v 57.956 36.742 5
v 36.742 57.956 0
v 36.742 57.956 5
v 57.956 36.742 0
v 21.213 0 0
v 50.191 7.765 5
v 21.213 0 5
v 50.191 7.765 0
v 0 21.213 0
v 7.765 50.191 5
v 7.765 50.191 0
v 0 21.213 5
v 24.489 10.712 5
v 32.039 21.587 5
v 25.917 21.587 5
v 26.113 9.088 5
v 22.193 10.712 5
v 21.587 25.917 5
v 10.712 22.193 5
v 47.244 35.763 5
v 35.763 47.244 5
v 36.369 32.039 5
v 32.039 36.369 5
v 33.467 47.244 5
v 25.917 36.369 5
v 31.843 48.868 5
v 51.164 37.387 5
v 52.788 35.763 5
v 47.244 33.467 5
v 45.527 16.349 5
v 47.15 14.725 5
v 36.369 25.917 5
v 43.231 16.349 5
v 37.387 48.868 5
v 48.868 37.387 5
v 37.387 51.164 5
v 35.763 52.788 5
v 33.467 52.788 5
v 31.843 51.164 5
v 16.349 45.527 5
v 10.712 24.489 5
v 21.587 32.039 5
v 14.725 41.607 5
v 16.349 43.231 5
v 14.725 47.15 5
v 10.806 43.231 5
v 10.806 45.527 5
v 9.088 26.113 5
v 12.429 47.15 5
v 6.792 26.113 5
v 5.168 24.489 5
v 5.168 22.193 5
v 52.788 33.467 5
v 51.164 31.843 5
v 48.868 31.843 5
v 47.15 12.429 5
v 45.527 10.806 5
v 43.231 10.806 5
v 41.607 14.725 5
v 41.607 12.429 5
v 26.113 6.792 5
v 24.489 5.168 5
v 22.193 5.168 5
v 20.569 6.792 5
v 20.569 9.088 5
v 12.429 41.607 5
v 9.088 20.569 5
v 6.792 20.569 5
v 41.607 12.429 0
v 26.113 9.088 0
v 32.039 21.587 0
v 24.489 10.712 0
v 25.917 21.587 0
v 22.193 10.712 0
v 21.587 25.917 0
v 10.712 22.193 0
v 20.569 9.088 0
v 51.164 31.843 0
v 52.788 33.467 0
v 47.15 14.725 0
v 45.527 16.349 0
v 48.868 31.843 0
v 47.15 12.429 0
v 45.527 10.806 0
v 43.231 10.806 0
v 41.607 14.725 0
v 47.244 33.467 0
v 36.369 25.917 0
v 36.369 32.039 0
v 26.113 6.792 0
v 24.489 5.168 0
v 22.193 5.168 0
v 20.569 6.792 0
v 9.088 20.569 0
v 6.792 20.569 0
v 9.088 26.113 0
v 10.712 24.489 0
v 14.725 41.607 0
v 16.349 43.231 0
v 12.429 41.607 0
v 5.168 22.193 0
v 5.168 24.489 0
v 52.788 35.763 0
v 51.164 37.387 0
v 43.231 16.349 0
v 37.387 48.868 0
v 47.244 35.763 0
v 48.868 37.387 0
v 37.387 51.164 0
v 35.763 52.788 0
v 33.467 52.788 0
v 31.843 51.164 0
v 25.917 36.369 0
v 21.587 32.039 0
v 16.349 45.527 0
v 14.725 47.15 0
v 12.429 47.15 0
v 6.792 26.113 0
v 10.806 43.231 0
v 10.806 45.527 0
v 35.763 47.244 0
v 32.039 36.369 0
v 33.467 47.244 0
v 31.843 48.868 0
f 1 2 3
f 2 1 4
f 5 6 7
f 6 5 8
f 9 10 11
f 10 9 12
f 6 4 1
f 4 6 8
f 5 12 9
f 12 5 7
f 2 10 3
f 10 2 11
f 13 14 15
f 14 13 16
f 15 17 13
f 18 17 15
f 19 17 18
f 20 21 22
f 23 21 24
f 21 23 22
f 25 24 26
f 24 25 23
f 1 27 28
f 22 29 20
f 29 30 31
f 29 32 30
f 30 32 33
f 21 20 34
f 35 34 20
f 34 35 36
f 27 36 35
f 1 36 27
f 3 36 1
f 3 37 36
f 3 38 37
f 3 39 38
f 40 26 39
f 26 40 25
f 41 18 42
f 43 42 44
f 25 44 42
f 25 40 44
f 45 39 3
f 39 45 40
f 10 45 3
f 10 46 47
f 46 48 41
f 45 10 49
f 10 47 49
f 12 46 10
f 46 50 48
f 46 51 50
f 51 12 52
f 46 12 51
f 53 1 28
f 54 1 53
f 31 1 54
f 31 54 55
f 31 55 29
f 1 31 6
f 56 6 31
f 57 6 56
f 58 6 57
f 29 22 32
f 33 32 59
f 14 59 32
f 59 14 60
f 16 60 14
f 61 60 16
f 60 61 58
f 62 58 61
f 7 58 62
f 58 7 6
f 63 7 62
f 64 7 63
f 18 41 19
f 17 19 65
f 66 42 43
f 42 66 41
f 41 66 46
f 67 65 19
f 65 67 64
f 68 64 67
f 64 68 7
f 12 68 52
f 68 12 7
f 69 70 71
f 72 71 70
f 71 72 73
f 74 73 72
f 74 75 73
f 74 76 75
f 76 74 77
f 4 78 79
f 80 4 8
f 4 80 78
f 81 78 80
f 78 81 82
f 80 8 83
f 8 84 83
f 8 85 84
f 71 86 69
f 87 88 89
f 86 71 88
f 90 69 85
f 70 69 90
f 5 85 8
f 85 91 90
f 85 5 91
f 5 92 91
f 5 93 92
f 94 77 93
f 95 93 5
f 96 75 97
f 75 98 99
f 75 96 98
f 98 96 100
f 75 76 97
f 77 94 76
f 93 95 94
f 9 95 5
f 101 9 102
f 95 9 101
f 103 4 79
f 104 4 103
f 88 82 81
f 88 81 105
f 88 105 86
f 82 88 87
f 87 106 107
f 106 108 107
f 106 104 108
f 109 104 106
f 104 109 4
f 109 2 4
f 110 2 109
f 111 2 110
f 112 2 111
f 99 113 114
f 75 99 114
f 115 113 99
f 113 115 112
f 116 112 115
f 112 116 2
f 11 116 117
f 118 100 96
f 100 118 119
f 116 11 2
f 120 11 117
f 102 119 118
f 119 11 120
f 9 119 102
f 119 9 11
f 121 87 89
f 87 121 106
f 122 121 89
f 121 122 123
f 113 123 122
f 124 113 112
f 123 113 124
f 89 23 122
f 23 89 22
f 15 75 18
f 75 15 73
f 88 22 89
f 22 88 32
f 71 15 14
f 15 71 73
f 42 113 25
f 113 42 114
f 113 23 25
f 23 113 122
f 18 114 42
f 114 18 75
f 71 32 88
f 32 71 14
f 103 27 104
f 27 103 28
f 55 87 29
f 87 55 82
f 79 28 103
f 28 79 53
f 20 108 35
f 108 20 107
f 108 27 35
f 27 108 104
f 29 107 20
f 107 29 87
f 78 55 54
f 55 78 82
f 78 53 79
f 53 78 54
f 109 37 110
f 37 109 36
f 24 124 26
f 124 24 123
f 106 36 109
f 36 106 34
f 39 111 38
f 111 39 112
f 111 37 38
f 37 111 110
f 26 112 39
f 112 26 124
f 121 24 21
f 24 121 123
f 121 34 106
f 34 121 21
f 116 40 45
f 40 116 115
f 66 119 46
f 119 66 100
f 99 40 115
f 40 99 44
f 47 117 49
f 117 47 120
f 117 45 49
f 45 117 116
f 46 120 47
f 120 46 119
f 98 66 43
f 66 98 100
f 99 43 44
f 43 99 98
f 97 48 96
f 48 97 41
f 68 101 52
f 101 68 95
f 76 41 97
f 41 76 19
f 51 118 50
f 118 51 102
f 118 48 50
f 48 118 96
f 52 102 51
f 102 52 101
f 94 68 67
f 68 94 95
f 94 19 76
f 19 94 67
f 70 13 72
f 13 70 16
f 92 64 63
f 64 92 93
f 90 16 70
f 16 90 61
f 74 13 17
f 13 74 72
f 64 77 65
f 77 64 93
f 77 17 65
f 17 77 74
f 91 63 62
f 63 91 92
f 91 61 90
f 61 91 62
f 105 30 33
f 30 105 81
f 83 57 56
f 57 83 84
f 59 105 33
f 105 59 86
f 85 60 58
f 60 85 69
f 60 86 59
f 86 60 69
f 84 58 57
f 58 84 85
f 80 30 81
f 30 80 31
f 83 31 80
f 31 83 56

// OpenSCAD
$fn = 32;

// ----------------------------------------------------------------------
// Polygon plate: 6-gon R30, 6 bolt windows
// ----------------------------------------------------------------------

// --- parameters (mm) ---
sides = 6;                // number of polygon sides
plate_r = 30;             // circumscribed radius of the polygon
bore_r = 8;               // centre bore radius
bolts = 6;                // number of bolt windows
ring_r = 21.78;           // bolt-circle radius
bolt_r = 3;               // bolt window radius
plate_t = 5;              // plate thickness, Z (extrusion height)

plate_d = 2 * plate_r;  // circumscribed diameter
bore_d = 2 * bore_r;  // centre bore diameter
bolt_d = 2 * bolt_r;  // bolt window diameter
ring_d = 2 * ring_r;  // bolt-circle diameter

profile = [[57.956, 36.742], [36.742, 57.956], [7.765, 50.191], [0, 21.213], [21.213, 0], [50.191, 7.765]];  // primary outline, 6 points, counter clockwise
void_1 = [[36.369, 32.039], [32.039, 36.369], [25.917, 36.369], [21.587, 32.039], [21.587, 25.917], [25.917, 21.587], [32.039, 21.587], [36.369, 25.917]];  // centre bore, 8 points
void_2 = [[52.788, 35.763], [51.164, 37.387], [48.868, 37.387], [47.244, 35.763], [47.244, 33.467], [48.868, 31.843], [51.164, 31.843], [52.788, 33.467]];  // bolt window 1, 8 points
void_3 = [[37.387, 51.164], [35.763, 52.788], [33.467, 52.788], [31.843, 51.164], [31.843, 48.868], [33.467, 47.244], [35.763, 47.244], [37.387, 48.868]];  // bolt window 2, 8 points
void_4 = [[16.349, 45.527], [14.725, 47.15], [12.429, 47.15], [10.806, 45.527], [10.806, 43.231], [12.429, 41.607], [14.725, 41.607], [16.349, 43.231]];  // bolt window 3, 8 points
void_5 = [[10.712, 24.489], [9.088, 26.113], [6.792, 26.113], [5.168, 24.489], [5.168, 22.193], [6.792, 20.569], [9.088, 20.569], [10.712, 22.193]];  // bolt window 4, 8 points
void_6 = [[26.113, 9.088], [24.489, 10.712], [22.193, 10.712], [20.569, 9.088], [20.569, 6.792], [22.193, 5.168], [24.489, 5.168], [26.113, 6.792]];  // bolt window 5, 8 points
void_7 = [[47.15, 14.725], [45.527, 16.349], [43.231, 16.349], [41.607, 14.725], [41.607, 12.429], [43.231, 10.806], [45.527, 10.806], [47.15, 12.429]];  // bolt window 6, 8 points

// --- the one profile operation ---
difference() {
  linear_extrude(height = plate_t) polygon(points = profile);
  translate([0, 0, -1])
    linear_extrude(height = plate_t + 2) polygon(points = void_1);
  translate([0, 0, -1])
    linear_extrude(height = plate_t + 2) polygon(points = void_2);
  translate([0, 0, -1])
    linear_extrude(height = plate_t + 2) polygon(points = void_3);
  translate([0, 0, -1])
    linear_extrude(height = plate_t + 2) polygon(points = void_4);
  translate([0, 0, -1])
    linear_extrude(height = plate_t + 2) polygon(points = void_5);
  translate([0, 0, -1])
    linear_extrude(height = plate_t + 2) polygon(points = void_6);
  translate([0, 0, -1])
    linear_extrude(height = plate_t + 2) polygon(points = void_7);
}
